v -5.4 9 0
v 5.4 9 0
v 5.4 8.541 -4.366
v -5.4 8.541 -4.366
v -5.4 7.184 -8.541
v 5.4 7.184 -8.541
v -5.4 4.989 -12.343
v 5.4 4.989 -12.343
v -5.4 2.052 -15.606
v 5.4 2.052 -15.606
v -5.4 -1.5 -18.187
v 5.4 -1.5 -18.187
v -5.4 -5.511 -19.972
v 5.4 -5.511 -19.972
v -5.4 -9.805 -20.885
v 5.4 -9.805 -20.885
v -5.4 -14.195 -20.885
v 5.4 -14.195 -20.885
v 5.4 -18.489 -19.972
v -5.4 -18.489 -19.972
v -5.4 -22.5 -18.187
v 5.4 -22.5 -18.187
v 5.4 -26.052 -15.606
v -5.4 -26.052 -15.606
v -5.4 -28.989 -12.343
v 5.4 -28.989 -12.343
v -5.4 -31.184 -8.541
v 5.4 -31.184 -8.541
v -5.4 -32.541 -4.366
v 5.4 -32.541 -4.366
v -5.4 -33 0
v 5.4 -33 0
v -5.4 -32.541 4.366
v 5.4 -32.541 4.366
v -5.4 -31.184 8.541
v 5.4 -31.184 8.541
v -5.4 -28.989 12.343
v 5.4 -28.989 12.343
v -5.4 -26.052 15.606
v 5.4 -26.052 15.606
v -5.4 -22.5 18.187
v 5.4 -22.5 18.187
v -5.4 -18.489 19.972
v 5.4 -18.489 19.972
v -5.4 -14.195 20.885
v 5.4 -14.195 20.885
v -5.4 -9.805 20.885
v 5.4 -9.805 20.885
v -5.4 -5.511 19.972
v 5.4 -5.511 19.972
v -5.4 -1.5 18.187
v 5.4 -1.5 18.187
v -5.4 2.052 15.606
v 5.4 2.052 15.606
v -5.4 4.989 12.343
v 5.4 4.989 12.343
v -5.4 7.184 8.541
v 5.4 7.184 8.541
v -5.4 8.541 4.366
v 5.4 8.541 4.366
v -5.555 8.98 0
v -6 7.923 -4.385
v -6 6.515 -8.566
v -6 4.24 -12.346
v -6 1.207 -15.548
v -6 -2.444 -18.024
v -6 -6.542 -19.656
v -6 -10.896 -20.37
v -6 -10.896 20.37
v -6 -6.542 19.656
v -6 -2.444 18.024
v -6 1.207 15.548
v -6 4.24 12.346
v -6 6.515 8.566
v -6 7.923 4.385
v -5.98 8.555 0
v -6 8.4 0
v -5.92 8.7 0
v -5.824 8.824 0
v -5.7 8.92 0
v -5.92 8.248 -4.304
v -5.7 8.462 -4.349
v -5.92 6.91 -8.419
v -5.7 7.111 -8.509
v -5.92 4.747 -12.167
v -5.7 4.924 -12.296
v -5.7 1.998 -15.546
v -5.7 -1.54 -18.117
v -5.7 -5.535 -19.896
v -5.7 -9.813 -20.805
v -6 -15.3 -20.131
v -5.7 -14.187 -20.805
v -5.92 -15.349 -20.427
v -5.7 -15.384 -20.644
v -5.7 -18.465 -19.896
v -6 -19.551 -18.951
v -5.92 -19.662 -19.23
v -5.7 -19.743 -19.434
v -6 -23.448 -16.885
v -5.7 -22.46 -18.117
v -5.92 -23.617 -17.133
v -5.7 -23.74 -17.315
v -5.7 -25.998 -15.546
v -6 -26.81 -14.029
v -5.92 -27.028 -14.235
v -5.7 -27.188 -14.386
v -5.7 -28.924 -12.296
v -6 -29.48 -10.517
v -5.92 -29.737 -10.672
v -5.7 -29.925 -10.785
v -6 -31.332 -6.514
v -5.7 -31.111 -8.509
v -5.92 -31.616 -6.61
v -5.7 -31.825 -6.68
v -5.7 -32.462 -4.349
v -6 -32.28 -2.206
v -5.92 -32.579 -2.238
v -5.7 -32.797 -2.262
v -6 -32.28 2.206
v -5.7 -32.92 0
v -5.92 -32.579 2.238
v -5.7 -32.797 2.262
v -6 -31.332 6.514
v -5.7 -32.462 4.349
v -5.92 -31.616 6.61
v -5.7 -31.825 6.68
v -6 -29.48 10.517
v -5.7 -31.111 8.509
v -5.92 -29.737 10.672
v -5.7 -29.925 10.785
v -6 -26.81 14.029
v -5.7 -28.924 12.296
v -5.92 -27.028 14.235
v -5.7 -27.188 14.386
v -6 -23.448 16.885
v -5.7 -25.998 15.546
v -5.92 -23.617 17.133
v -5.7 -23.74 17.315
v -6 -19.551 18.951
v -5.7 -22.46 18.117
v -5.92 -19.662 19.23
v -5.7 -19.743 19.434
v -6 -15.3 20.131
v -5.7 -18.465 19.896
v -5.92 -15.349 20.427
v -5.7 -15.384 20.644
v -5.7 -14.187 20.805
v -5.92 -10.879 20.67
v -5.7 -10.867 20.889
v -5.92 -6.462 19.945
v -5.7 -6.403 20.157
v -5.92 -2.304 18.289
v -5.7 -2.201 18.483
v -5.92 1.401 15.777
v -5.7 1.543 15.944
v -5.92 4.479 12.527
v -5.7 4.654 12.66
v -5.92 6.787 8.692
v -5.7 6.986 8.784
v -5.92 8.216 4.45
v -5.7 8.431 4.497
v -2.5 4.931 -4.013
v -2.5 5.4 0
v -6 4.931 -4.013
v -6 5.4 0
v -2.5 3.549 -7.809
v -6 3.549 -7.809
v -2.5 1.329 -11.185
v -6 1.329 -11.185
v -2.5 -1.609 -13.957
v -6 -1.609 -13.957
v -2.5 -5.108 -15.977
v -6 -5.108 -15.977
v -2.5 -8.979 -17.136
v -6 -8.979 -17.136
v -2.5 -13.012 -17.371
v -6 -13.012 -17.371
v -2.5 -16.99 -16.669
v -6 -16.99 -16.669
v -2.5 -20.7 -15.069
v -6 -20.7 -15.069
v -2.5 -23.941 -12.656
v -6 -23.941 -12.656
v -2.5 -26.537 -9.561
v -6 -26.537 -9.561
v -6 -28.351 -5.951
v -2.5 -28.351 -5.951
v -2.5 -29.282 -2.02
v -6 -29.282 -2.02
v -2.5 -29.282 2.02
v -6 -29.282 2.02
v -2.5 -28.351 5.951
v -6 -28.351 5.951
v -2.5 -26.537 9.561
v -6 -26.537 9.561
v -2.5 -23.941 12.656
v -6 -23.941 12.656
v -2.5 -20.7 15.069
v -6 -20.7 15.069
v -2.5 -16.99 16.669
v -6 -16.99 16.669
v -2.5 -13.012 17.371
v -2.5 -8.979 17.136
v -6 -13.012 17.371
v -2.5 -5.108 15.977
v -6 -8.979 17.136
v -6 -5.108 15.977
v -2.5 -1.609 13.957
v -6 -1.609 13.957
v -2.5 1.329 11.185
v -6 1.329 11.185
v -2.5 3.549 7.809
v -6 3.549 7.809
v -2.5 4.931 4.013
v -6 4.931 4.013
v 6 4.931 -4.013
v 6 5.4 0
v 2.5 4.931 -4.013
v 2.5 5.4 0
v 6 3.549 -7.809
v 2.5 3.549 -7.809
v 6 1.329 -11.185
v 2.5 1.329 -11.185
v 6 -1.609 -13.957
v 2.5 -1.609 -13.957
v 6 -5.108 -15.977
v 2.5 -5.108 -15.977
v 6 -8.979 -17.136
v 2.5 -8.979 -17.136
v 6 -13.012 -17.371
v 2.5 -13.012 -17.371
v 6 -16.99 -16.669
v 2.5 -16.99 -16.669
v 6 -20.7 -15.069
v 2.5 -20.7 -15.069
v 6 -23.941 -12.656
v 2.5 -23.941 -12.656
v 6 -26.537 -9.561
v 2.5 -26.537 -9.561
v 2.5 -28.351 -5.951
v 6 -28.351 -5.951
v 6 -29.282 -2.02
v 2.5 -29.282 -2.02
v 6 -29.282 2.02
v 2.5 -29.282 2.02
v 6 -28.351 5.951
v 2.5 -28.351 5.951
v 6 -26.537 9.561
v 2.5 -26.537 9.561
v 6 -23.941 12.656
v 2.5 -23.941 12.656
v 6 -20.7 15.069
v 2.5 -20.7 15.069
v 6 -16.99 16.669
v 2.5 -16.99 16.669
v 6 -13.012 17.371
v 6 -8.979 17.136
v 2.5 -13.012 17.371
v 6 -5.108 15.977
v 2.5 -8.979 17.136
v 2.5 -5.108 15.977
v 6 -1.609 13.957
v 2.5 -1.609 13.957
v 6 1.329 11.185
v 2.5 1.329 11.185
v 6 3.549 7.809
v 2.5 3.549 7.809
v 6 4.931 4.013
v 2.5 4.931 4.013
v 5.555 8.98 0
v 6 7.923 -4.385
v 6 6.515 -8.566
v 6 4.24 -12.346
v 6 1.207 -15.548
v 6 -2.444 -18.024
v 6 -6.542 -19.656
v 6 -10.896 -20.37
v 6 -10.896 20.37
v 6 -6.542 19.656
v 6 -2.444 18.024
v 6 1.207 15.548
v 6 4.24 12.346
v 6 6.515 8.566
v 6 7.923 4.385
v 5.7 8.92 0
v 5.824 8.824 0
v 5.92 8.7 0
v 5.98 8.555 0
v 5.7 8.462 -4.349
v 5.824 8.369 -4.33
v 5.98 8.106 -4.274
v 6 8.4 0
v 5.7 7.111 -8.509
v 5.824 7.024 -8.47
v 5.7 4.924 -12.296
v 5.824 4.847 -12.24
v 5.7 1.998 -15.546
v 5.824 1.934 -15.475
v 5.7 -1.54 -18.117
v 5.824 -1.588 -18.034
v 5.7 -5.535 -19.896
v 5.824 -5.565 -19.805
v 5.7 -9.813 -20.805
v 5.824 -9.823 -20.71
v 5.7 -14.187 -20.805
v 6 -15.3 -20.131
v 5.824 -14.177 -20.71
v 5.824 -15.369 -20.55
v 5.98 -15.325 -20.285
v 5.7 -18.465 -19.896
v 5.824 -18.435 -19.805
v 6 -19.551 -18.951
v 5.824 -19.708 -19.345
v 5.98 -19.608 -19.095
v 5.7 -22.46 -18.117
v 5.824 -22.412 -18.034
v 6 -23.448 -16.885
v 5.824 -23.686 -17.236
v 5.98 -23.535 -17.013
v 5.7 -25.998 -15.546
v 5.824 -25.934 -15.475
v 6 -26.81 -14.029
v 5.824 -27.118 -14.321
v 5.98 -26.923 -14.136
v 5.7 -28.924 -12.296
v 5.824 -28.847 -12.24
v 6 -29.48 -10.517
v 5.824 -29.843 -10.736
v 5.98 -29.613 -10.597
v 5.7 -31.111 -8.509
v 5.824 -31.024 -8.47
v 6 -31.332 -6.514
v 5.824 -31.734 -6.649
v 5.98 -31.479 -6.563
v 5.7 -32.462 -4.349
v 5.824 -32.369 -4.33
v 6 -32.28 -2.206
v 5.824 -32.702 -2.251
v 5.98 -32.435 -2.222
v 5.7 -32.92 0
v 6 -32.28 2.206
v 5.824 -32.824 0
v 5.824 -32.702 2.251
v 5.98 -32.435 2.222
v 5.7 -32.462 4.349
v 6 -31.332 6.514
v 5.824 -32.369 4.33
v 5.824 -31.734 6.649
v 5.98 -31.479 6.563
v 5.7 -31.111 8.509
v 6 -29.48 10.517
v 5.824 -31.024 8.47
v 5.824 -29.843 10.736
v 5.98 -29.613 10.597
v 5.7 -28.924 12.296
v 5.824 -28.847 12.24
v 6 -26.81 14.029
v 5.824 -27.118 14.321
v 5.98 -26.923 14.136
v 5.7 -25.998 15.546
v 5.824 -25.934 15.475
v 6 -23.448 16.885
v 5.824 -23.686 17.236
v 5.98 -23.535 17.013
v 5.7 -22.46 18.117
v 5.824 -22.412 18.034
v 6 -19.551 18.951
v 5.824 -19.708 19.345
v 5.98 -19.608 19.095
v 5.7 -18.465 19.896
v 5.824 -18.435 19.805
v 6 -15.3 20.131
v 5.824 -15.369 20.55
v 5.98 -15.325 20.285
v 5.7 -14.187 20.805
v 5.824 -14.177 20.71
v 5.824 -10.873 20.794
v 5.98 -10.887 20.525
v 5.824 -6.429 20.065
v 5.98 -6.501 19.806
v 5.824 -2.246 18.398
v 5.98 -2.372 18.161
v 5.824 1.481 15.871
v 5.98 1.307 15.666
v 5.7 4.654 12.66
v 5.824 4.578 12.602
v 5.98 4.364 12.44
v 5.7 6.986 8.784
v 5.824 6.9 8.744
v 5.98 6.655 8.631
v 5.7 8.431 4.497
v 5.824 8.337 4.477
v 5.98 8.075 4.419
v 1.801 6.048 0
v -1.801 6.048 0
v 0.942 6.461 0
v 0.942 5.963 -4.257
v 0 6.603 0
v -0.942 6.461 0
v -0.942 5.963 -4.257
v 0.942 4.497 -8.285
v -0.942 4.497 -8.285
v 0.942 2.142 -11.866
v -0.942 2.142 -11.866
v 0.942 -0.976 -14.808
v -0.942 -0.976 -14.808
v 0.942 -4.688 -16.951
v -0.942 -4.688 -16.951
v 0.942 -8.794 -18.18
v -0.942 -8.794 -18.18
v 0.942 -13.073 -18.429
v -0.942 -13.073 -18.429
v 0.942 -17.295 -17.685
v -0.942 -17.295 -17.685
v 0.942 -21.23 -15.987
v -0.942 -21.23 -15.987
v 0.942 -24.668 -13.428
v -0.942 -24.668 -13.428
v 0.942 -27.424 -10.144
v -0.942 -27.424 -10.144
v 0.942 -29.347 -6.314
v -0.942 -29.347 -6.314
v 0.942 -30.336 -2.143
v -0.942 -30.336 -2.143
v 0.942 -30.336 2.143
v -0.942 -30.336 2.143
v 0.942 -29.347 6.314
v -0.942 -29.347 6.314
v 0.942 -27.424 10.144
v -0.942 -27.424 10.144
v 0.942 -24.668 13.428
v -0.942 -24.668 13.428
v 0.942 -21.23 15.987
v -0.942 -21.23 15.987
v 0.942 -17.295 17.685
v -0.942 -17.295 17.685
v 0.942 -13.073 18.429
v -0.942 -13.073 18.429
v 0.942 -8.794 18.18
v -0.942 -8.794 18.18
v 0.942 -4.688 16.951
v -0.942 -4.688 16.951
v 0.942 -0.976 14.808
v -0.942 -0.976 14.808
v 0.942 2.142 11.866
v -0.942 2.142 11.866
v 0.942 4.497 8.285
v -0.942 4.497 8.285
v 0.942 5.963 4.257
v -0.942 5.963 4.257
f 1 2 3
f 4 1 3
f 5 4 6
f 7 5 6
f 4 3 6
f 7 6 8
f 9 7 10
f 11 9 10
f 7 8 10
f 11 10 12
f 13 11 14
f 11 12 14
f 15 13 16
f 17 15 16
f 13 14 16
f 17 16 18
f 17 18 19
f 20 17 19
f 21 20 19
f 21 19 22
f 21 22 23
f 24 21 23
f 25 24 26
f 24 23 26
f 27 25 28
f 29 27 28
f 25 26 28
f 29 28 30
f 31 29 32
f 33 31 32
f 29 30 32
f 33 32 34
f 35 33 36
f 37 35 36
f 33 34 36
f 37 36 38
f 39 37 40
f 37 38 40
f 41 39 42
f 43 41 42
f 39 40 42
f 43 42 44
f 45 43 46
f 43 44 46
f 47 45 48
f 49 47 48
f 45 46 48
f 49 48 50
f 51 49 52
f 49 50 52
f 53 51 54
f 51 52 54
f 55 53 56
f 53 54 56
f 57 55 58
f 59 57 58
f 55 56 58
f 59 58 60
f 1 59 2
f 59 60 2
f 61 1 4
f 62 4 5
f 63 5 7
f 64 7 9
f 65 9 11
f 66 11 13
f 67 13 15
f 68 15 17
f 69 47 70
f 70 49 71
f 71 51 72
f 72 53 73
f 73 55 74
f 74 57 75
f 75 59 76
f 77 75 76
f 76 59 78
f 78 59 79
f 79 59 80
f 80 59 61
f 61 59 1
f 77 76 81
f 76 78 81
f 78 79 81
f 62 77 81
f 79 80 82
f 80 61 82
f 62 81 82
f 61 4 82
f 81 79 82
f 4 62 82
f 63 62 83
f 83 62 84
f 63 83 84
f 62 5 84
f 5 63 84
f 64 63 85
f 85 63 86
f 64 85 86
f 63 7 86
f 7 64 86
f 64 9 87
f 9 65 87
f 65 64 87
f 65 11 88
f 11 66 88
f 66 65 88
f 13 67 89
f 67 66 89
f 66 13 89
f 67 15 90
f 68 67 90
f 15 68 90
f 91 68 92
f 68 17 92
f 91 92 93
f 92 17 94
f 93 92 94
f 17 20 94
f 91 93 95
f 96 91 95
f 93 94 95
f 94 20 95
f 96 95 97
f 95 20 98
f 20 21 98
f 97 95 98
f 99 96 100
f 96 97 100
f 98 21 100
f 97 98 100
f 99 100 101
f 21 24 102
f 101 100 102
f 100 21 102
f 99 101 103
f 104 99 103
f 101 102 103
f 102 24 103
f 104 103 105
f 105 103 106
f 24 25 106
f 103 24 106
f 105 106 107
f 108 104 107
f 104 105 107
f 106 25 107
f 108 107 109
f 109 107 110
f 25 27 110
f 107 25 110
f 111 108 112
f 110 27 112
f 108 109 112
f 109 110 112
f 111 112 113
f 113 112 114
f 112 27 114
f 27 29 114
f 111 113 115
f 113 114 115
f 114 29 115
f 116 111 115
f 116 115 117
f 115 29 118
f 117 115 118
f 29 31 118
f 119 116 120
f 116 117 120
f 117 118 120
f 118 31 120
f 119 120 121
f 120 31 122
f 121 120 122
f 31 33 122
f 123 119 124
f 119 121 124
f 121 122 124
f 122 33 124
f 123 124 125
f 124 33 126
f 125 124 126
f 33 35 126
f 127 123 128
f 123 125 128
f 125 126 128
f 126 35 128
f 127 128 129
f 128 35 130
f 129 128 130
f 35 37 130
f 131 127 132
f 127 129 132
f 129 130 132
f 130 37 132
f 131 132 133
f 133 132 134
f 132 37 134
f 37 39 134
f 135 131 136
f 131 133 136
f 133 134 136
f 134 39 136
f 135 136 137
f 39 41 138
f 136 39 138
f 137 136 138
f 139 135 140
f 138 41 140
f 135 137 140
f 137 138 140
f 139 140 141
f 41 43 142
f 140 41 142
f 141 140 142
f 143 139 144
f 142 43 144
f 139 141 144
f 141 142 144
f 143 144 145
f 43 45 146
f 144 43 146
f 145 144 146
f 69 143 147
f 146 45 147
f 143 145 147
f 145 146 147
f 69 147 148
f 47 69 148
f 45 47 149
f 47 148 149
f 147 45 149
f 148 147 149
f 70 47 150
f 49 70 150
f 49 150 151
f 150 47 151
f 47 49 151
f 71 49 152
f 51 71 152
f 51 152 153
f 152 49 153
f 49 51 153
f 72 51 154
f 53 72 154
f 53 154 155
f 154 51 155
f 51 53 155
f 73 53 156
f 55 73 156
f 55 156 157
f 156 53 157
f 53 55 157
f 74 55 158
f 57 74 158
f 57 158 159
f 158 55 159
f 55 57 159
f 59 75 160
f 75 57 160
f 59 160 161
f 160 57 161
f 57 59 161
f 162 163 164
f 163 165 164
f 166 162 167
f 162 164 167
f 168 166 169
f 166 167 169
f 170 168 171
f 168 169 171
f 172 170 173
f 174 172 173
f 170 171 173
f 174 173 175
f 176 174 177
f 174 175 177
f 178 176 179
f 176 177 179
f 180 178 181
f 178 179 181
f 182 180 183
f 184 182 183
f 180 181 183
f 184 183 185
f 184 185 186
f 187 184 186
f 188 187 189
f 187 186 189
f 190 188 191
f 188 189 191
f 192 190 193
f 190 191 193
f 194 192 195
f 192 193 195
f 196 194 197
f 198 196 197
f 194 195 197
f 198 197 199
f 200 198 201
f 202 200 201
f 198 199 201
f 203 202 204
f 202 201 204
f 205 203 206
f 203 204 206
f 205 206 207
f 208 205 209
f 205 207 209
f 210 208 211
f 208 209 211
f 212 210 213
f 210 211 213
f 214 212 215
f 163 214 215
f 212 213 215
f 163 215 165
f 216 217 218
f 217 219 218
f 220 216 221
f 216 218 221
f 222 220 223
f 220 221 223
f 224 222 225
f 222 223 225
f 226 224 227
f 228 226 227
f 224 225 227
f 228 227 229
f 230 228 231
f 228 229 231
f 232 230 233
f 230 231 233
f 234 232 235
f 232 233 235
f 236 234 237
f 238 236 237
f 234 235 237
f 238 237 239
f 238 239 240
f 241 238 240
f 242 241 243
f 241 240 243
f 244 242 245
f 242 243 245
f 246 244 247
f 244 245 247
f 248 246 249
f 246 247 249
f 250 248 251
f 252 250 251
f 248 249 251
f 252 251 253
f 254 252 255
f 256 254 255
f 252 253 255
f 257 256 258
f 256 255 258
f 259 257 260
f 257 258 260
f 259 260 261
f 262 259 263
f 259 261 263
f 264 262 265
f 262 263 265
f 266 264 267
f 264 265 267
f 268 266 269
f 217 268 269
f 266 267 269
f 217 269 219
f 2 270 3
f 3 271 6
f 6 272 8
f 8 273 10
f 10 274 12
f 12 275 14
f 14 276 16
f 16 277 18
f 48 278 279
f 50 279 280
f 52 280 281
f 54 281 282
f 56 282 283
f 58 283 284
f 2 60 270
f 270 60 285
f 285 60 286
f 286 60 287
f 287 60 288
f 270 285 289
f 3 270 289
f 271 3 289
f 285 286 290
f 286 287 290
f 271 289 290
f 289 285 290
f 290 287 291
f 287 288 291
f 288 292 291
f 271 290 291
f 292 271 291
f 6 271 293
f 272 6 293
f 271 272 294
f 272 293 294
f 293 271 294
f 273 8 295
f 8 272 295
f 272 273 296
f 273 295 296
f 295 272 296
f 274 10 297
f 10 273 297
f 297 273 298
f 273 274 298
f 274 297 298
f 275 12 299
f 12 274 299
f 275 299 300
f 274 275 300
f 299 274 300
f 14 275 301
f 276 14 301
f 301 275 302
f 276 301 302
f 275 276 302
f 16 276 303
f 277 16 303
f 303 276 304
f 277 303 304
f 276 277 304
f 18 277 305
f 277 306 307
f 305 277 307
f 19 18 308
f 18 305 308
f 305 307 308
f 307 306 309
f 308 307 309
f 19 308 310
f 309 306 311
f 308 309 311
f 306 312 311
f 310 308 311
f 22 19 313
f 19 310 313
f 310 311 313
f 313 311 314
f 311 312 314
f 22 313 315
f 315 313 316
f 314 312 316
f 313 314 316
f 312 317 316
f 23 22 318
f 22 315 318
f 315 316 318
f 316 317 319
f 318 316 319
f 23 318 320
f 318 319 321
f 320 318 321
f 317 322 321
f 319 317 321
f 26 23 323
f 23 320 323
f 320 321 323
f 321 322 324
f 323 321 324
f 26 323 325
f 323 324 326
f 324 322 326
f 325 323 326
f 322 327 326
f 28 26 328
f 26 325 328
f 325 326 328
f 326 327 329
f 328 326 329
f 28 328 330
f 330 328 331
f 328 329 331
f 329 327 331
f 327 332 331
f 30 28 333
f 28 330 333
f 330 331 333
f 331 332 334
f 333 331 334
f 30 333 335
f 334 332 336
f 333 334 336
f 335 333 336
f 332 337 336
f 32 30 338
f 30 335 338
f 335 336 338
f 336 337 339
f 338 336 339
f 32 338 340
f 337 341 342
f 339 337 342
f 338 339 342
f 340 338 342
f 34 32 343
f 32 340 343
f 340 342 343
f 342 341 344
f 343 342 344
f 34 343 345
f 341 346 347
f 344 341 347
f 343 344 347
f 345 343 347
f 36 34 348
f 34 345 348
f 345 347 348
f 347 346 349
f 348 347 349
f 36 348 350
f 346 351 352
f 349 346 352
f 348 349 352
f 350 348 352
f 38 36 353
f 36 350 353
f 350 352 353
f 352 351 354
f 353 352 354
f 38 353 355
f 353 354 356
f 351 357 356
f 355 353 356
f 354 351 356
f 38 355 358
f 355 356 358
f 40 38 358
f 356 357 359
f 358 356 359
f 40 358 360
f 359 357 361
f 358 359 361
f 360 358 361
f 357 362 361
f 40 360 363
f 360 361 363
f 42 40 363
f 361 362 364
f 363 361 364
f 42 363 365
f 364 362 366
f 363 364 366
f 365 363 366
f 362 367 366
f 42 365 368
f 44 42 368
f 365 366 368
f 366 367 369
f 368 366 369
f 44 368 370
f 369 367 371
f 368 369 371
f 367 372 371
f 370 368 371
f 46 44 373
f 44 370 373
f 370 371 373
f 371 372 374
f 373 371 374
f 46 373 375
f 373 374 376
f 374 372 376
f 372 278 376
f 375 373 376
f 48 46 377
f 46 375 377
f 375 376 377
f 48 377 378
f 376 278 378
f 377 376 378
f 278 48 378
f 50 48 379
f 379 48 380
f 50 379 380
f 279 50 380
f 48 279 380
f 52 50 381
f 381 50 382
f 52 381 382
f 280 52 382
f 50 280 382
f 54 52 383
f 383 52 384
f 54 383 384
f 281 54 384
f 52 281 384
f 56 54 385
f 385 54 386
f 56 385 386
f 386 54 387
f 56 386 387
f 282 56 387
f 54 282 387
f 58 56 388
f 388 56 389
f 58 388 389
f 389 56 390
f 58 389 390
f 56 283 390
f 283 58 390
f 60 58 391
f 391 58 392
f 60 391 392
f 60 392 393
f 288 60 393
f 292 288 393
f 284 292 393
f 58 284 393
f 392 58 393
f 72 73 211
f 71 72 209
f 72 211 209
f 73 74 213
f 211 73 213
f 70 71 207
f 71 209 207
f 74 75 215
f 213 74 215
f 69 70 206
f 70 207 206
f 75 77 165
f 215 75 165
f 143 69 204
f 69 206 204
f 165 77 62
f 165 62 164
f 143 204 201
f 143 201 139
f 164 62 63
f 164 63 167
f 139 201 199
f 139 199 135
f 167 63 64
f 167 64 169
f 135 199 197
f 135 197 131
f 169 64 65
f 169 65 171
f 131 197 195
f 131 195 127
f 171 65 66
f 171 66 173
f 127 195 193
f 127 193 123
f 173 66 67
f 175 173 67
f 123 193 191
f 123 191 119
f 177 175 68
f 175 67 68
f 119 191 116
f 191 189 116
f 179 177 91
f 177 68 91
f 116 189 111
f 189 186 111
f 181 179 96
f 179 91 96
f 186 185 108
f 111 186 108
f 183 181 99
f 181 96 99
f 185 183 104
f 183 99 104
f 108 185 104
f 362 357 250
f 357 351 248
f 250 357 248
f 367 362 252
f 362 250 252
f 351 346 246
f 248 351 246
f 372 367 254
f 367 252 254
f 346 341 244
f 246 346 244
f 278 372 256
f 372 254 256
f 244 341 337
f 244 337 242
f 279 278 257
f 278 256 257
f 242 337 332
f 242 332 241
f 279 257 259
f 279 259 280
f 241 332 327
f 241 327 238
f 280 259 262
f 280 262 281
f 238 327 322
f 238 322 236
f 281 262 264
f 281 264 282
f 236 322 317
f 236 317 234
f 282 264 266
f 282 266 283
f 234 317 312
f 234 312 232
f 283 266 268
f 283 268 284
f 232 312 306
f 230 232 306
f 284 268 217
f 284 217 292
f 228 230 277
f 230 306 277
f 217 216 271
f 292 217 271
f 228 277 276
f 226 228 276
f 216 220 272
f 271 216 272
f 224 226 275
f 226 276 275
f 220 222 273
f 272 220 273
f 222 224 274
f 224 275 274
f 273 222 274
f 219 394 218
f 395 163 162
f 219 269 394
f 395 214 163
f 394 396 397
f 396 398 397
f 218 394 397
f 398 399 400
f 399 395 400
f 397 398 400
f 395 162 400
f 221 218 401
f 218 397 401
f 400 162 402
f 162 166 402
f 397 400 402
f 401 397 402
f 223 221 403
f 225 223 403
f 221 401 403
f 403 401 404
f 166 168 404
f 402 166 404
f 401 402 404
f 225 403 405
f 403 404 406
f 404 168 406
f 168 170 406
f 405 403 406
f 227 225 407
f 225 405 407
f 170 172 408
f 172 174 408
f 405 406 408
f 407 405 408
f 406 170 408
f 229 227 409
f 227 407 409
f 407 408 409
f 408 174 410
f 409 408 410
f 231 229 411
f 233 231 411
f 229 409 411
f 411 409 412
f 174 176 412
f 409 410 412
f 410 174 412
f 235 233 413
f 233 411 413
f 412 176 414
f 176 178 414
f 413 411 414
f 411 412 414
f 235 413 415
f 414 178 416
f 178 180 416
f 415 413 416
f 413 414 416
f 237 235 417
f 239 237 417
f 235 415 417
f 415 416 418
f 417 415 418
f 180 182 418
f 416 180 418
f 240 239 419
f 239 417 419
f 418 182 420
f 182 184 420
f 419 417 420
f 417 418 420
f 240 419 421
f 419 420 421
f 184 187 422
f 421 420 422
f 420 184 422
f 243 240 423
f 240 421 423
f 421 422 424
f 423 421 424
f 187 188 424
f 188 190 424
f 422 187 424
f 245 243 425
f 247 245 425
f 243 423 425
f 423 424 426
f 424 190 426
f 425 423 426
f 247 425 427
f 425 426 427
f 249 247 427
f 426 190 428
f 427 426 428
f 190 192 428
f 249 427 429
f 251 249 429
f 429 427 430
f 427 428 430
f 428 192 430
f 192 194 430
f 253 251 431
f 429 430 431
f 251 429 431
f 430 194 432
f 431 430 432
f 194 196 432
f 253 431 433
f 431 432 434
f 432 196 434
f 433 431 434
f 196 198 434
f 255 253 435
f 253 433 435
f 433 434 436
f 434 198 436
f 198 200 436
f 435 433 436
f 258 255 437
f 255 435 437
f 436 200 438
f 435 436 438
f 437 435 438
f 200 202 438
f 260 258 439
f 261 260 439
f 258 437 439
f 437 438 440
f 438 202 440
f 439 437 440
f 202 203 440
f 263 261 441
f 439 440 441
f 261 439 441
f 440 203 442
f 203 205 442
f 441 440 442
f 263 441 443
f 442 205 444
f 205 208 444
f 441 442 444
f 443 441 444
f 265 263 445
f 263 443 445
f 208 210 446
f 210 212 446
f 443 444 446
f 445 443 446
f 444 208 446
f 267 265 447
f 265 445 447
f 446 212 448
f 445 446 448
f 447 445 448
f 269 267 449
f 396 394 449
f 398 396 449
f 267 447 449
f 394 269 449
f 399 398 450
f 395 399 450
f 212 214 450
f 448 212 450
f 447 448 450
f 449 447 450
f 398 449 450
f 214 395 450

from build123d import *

# Parameters (mm, degrees)
FILLET1_R = 0.6


with BuildPart() as part:
    # Sketch1 → Revolve1 (revolve)
    with BuildSketch(Plane.XY):
        with BuildLine():
            ThreePointArc((2.5, 5.4), (0, 6.602501564), (-2.5, 5.4))
            Line((-2.5, 5.4), (-6, 5.4))
            Line((-6, 5.4), (-6, 9))
            Line((-6, 9), (6, 9))
            Line((6, 9), (6, 5.4))
            Line((6, 5.4), (2.5, 5.4))
        make_face()
    revolve(axis=Axis((6, -12, 0), (-1, 0, 0)))

    # Fillet1
    fillet1_edges = [part.edges().sort_by_distance(p)[0] for p in [
        (-6, -33, 0),
        (6, -33, 0),
    ]]
    fillet(fillet1_edges, radius=FILLET1_R)


solid = part.part
